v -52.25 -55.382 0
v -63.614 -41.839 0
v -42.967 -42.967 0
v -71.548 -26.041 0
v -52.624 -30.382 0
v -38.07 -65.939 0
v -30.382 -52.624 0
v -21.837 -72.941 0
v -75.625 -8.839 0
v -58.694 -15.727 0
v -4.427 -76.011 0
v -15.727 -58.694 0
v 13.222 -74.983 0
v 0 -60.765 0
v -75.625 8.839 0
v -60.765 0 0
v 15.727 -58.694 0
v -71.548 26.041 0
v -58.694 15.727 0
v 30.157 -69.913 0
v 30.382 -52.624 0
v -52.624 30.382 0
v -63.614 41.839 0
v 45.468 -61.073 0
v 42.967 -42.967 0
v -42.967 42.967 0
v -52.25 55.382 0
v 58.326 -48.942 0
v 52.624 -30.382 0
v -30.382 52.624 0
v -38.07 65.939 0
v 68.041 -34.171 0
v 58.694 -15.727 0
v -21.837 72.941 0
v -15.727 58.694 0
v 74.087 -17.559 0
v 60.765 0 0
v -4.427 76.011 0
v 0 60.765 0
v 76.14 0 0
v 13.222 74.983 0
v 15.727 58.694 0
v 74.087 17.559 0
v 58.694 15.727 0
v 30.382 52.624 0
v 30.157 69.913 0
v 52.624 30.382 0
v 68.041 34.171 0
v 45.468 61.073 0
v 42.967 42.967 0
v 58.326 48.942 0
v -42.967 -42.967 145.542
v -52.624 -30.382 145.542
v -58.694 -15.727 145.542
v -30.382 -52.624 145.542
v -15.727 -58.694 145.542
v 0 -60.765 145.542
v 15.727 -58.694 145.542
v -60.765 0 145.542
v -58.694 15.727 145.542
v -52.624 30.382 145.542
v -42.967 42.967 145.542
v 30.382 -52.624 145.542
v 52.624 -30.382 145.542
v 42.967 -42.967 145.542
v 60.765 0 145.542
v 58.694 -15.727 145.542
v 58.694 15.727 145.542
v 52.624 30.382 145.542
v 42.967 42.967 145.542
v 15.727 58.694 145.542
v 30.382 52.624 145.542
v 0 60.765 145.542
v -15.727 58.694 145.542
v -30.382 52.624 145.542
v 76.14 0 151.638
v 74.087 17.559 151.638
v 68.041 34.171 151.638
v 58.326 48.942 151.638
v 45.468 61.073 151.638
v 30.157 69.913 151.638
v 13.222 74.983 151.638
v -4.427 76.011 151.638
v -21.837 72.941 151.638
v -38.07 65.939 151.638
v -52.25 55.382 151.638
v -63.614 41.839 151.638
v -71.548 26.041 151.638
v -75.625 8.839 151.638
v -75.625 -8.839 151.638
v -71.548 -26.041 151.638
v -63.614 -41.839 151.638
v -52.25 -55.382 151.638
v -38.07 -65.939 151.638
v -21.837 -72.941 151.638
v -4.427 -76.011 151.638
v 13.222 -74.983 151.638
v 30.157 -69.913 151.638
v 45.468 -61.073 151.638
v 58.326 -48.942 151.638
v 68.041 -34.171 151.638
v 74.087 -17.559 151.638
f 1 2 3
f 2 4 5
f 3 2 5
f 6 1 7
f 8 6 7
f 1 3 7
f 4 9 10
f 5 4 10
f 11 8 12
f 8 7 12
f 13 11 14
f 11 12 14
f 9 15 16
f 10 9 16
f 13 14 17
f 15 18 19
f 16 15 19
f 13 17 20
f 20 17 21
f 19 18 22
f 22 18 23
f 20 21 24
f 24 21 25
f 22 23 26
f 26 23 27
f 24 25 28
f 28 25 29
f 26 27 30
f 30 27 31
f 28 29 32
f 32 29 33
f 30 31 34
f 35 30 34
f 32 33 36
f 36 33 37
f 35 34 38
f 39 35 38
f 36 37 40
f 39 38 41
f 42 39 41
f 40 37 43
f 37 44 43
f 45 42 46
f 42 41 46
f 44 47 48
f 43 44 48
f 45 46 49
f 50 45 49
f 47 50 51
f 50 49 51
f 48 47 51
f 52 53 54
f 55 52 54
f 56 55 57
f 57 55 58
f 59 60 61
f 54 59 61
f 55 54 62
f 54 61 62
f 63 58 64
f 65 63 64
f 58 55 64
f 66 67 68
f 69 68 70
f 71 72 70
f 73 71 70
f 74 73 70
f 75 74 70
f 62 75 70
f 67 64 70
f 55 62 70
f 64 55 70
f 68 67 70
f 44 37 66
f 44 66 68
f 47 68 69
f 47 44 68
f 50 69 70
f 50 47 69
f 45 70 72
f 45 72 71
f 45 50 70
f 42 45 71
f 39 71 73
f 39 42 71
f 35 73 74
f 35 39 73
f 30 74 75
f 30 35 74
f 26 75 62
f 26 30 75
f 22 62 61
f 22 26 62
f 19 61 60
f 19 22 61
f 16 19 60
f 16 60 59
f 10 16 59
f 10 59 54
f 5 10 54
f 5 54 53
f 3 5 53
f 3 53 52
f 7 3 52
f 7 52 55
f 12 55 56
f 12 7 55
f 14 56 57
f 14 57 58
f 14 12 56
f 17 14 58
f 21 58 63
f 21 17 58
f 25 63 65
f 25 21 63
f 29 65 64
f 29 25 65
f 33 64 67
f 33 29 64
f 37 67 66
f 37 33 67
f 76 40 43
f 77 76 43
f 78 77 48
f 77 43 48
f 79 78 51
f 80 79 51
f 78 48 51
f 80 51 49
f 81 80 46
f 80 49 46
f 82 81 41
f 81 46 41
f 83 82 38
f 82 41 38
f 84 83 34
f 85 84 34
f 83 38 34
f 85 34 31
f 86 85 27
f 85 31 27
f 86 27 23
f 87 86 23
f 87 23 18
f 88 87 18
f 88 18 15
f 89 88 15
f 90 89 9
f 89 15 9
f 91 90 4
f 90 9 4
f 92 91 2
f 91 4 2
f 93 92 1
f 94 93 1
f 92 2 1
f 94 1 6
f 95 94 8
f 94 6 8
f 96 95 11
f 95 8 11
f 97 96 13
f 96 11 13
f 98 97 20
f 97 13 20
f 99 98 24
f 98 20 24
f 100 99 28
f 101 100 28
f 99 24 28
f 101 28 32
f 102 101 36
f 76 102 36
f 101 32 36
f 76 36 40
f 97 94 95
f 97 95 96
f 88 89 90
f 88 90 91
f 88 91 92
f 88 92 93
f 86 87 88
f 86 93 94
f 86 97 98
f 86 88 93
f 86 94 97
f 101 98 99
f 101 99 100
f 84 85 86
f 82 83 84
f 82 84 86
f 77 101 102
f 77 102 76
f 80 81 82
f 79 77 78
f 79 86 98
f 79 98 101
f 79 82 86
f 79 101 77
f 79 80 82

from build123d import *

# Parameters (mm, degrees)
F0_R     = 76.139755
F1_DEPTH = 151.638
F2_R     = 67.495024
F3_DEPTH = 149.098
F4_R     = 68.23758
F4_R_2   = 59.894351
F5_DEPTH = 25.4
F6_R     = 60.764982
F7_DEPTH = 145.542


with BuildPart() as f1:
    # F0 (on Top) → F1 (new body)
    with BuildSketch(Plane.XY):
        Circle(F0_R)
    extrude(amount=F1_DEPTH)

    # F2 (on Top) → F3 (join)
    with BuildSketch(Plane.XY):
        Circle(F2_R)
    extrude(amount=F3_DEPTH)

    # F4 (on Top) → F5 (cut)
    with BuildSketch(Plane.XY):
        Circle(F4_R)
        Circle(F4_R_2, mode=Mode.SUBTRACT)
    extrude(amount=-F5_DEPTH, mode=Mode.SUBTRACT)

    # F6 (on Top) → F7 (cut)
    with BuildSketch(Plane.XY):
        Circle(F6_R)
    extrude(amount=F7_DEPTH, mode=Mode.SUBTRACT)


solid = f1.part
